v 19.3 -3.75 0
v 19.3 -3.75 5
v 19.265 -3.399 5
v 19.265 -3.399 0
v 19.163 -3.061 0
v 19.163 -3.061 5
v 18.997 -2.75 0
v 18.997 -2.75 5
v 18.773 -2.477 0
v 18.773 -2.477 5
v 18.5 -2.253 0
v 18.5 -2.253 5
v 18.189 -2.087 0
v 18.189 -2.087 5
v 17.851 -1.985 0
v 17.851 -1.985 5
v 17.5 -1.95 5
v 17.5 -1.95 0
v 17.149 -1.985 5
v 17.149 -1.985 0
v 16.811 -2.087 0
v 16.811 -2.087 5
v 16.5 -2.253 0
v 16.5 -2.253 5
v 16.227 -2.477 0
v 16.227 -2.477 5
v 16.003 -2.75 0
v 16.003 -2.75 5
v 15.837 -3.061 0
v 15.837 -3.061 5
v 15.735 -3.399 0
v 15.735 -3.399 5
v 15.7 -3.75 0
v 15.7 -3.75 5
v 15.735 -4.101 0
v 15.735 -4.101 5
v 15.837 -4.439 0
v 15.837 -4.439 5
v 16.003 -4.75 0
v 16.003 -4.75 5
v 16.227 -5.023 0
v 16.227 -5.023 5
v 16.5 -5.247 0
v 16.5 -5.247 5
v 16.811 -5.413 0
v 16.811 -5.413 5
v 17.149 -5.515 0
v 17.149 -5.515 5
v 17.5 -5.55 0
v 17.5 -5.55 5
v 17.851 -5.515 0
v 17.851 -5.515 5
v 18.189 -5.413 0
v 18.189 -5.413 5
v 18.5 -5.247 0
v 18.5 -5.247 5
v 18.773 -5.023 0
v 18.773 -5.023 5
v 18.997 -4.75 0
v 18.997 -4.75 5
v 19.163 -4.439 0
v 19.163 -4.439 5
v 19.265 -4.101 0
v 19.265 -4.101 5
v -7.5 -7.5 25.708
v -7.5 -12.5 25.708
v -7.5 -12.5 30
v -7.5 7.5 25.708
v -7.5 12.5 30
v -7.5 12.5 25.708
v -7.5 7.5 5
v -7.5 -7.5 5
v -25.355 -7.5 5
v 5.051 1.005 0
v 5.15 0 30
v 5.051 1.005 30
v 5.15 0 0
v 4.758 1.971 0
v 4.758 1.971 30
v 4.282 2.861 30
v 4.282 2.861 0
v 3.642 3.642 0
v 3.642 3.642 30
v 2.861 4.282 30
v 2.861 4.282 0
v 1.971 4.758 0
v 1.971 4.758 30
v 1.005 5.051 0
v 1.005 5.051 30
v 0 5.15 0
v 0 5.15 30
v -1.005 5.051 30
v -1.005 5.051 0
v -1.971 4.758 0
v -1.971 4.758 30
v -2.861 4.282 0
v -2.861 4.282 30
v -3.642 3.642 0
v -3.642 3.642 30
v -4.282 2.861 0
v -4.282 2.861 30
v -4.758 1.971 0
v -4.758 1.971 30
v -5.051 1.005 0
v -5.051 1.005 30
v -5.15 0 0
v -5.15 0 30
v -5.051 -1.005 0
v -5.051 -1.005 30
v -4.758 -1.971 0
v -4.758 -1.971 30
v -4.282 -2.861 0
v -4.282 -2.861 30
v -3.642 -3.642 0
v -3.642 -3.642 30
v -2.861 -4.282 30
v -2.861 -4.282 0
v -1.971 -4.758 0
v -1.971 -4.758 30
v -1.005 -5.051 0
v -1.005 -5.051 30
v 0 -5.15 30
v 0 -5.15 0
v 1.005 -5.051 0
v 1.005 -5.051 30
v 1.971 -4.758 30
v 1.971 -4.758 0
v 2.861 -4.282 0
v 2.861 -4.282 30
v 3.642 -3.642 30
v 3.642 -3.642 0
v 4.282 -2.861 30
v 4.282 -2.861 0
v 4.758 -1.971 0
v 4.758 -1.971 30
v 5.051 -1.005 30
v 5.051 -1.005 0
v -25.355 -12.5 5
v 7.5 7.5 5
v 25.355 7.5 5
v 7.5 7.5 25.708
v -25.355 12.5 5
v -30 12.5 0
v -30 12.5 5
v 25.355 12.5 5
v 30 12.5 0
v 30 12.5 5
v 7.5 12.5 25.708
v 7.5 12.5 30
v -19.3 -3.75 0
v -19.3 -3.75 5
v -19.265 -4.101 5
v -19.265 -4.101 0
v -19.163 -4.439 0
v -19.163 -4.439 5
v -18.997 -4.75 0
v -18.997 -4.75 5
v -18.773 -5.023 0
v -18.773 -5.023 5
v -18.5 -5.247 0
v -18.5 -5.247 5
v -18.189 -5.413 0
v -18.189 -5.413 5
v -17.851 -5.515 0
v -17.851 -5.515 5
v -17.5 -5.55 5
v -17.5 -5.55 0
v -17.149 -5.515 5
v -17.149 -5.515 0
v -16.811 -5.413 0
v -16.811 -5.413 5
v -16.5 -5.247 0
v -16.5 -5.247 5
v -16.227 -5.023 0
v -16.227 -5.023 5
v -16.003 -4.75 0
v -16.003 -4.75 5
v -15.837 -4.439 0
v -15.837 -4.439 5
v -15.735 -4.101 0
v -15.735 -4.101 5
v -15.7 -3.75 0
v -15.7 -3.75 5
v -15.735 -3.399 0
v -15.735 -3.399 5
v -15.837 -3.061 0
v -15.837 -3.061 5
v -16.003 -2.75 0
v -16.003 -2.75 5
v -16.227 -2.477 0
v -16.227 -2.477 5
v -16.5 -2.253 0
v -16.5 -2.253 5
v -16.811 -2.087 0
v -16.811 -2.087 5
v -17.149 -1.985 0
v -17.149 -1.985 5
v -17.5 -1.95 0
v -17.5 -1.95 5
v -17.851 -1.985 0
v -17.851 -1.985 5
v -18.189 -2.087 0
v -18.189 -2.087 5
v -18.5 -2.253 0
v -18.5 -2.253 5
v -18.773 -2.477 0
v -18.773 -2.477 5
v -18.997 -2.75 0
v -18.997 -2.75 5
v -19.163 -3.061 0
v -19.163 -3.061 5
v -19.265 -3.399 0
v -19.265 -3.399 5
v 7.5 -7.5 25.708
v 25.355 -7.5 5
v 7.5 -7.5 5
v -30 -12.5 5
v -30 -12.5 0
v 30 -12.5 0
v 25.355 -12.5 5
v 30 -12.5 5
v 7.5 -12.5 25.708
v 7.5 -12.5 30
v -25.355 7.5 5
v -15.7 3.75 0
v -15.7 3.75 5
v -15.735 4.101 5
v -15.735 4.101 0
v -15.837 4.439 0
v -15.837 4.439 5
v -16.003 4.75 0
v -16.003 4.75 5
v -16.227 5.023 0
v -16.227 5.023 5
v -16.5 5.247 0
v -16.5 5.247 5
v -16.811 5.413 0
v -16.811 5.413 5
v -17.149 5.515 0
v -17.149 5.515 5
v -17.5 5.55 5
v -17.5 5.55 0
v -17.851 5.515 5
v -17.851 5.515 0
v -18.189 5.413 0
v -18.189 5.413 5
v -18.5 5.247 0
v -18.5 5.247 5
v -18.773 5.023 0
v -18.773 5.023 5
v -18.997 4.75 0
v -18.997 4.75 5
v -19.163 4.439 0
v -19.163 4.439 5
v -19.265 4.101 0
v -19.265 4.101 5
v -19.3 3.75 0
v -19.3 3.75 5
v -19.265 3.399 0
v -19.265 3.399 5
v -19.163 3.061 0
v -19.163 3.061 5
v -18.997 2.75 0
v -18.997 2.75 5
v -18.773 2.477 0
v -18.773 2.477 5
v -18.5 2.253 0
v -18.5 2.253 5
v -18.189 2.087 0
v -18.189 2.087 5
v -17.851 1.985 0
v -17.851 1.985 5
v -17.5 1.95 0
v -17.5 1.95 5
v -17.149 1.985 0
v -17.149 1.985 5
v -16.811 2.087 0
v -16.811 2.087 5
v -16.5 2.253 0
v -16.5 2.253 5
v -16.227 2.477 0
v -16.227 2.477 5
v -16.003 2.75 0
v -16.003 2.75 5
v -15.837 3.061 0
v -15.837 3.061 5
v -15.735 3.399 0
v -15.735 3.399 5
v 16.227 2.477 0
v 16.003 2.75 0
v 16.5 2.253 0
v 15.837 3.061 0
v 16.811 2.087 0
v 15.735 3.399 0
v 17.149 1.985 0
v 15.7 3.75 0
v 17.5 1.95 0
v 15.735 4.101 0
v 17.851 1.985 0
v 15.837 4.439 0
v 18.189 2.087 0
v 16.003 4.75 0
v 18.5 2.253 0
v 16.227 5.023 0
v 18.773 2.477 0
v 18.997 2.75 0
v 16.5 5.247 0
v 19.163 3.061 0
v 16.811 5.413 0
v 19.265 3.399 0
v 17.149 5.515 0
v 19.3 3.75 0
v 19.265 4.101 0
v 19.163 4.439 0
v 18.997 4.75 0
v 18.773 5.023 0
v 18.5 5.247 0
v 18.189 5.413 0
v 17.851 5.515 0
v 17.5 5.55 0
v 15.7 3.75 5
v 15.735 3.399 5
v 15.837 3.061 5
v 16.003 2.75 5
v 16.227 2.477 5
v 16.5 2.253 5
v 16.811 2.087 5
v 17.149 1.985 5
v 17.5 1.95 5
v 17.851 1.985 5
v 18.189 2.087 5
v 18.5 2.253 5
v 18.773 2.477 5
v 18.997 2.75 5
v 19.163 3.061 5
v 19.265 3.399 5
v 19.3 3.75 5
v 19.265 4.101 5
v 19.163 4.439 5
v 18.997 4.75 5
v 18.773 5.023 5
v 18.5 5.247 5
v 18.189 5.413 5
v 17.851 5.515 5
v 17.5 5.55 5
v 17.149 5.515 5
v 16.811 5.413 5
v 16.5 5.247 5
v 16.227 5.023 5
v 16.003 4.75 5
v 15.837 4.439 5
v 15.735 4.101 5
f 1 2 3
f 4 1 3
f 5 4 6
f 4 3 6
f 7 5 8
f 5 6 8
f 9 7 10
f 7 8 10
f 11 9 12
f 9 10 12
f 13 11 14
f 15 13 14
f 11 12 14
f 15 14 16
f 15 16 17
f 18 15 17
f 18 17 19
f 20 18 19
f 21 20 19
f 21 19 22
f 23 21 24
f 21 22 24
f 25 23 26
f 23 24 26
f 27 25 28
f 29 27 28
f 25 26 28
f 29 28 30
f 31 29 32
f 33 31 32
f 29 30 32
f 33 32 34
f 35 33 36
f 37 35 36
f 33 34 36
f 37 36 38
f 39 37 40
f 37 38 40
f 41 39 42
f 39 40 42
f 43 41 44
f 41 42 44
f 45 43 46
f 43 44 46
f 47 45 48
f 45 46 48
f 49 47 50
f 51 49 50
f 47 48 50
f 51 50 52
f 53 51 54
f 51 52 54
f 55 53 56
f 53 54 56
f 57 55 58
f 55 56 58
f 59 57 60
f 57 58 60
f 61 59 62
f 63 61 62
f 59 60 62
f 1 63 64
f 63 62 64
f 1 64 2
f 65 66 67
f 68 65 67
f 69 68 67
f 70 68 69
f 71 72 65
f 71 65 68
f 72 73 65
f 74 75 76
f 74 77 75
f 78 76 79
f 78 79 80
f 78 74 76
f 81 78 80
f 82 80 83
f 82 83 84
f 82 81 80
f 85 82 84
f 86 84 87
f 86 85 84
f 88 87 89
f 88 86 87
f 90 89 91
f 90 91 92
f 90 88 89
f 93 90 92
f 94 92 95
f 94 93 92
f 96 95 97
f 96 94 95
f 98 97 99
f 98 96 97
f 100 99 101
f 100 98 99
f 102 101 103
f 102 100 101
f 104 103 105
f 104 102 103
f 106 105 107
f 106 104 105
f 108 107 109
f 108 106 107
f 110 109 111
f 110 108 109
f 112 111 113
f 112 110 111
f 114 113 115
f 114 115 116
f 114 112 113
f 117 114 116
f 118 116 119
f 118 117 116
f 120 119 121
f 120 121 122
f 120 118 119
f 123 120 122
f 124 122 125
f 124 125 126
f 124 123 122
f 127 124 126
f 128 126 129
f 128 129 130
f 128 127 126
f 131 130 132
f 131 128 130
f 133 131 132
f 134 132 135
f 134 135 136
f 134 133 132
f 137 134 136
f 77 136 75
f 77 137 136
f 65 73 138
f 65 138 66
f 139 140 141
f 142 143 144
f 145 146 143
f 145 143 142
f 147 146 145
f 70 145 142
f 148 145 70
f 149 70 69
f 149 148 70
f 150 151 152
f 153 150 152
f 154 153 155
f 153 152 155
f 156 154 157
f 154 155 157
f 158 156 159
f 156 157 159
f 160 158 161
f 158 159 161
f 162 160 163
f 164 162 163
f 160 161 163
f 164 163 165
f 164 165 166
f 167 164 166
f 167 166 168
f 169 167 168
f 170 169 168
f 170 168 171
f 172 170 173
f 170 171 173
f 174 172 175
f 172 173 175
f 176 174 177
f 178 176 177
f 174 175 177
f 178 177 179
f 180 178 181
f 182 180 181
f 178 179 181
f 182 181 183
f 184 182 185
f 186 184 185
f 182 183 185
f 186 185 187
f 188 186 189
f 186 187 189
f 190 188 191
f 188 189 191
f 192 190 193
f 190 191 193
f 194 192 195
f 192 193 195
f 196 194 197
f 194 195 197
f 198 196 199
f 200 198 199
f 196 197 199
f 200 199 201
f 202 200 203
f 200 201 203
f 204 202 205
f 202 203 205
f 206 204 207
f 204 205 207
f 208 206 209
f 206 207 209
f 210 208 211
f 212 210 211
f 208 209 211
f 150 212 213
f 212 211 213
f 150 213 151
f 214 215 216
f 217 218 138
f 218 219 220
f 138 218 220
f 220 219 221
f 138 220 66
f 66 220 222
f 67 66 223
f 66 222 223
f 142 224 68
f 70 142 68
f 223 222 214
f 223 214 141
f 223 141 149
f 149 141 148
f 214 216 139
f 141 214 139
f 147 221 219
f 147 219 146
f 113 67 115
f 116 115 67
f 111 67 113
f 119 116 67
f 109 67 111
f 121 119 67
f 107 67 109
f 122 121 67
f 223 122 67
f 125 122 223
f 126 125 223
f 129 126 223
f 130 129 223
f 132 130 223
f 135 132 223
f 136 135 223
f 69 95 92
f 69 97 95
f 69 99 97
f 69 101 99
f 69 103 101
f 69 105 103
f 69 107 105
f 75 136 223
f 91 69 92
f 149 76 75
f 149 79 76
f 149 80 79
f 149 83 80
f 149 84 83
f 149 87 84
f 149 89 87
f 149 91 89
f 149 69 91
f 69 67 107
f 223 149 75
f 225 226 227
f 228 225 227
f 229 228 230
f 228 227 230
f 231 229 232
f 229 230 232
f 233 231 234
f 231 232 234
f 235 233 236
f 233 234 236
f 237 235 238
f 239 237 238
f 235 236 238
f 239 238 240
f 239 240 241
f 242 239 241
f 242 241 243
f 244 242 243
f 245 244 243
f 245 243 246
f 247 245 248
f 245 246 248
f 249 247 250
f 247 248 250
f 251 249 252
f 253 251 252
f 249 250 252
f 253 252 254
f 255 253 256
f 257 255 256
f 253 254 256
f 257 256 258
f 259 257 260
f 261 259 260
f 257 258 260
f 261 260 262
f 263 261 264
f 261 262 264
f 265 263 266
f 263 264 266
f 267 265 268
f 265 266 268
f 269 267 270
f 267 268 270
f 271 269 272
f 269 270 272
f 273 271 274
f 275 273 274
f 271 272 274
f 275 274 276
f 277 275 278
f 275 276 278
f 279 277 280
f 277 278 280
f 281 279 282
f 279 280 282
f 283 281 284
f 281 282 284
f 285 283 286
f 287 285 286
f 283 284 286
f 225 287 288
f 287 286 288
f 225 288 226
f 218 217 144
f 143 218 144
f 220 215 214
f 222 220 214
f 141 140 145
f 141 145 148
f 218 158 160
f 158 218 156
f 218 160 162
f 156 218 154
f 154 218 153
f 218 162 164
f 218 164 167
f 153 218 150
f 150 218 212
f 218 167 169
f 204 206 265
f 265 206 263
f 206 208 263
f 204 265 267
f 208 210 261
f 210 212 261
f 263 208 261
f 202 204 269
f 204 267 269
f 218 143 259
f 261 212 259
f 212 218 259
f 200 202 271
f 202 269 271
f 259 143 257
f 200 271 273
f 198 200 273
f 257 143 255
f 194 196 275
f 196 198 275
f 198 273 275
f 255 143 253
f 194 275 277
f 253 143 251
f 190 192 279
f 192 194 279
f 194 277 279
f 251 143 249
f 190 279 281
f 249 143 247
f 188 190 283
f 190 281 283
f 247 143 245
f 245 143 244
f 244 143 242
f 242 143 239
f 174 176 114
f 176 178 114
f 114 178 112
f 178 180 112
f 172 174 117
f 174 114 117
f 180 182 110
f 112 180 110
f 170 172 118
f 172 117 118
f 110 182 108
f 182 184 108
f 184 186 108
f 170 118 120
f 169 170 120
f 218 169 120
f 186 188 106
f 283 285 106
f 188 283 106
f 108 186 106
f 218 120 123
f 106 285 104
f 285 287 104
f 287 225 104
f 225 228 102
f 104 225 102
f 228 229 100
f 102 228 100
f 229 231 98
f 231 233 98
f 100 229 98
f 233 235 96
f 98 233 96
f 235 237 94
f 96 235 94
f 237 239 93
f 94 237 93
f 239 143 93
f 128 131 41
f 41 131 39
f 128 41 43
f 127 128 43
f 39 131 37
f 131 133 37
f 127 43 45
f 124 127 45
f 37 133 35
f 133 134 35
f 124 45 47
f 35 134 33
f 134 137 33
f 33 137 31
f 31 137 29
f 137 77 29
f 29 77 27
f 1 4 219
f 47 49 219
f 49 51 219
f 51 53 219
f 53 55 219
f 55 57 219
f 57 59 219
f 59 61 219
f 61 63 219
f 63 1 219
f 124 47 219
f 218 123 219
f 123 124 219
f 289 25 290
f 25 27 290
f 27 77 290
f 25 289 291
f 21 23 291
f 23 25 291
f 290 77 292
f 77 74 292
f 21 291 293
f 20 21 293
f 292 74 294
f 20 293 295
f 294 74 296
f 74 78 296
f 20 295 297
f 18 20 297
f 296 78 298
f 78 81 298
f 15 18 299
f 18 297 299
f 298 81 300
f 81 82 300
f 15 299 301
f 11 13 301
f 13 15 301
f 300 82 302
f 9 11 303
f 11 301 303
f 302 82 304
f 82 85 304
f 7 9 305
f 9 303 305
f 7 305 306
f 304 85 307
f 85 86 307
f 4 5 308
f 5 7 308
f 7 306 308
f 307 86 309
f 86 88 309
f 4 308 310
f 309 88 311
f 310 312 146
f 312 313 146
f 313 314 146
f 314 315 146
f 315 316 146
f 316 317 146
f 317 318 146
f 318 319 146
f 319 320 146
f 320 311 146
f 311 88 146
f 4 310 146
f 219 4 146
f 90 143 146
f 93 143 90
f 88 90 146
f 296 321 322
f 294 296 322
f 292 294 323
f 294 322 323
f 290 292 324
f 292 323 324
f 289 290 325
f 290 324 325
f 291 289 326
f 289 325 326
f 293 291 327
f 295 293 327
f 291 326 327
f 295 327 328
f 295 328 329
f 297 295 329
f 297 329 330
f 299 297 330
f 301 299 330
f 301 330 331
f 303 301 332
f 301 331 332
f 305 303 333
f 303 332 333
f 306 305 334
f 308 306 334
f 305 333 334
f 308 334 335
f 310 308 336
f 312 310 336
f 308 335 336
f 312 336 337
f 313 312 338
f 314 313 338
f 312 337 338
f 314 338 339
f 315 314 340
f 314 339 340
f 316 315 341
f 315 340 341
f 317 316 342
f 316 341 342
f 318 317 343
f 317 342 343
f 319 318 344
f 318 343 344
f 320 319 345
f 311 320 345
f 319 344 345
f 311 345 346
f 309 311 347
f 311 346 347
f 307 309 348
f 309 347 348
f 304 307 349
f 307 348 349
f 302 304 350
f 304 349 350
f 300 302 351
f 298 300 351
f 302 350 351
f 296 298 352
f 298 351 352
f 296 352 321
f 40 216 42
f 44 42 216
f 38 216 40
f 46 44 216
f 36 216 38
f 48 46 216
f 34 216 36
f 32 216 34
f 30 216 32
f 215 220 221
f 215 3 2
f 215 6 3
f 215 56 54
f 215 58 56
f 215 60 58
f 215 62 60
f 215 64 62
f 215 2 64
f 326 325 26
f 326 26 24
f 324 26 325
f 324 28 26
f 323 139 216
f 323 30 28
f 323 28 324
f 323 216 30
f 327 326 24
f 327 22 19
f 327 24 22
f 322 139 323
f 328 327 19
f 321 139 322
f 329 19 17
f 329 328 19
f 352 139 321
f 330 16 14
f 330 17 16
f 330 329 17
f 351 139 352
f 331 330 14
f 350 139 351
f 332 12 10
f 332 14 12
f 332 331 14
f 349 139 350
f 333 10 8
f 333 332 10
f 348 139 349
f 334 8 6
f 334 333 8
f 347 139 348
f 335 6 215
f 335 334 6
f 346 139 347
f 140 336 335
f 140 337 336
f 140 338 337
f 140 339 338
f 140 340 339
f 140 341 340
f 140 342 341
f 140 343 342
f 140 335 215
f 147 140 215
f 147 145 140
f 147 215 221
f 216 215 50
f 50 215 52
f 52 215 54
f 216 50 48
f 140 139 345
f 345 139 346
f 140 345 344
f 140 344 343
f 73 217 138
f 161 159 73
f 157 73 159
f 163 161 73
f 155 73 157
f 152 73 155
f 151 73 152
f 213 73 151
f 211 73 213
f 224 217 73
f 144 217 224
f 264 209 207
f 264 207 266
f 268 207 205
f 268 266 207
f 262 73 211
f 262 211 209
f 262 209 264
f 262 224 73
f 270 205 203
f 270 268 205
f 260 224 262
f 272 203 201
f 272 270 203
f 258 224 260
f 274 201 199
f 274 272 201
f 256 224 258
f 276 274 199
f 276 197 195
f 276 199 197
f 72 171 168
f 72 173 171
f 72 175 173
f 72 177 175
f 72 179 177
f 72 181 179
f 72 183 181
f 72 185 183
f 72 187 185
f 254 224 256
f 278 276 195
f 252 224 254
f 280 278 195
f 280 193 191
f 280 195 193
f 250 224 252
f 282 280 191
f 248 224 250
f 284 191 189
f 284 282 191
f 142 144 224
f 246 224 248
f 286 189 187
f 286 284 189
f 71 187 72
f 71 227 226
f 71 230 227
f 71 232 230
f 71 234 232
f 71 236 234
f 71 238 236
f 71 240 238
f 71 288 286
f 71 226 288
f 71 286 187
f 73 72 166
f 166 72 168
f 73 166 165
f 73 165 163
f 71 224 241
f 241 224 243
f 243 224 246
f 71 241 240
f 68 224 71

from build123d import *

# Parameters (mm, degrees)
SKETCH_1_W               = 40
SKETCH_1_H               = 15
EXTRUDE_1_DEPTH          = 5
SKETCH_2_R               = 5.15
SKETCH_2_R_2             = 1.8
CUT_EXTRUDE_1_DEPTH      = 5
SKETCH_3_W               = 15
SKETCH_3_H               = 15
SKETCH_3_R               = 5.05
EXTRUDE_2_DEPTH          = 25
SKETCH_4_R               = 5.5
CUT_EXTRUDE_2_DEPTH      = 31
SKETCH_5_W               = 10
SKETCH_5_H               = 15
EXTRUDE_3_DEPTH          = 5
SKETCH_6_R               = 1.8
CUT_EXTRUDE_3_DEPTH      = 5
SKETCH_7_W               = 60
SKETCH_7_H               = 5
EXTRUDE_4_DEPTH          = 5
SKETCH_8_W               = 15
SKETCH_8_H               = 5
EXTRUDE_5_DEPTH          = 25
RIB_1_REACH              = 51.244
SKETCH_9_WALL_W          = 127.83111072
SKETCH_9_WALL_H          = 5
MIRROR_2_COPY_1_REACH    = 51.244
MIRROR_2_COPY_1_SKETCH_W = 127.83111072
MIRROR_2_COPY_1_SKETCH_H = 5
SKETCH_11_R              = 1.8
EXTRUDE_6_DEPTH          = 5
SKETCH_12_R              = 1.8
CUT_EXTRUDE_4_DEPTH      = 5
SKETCH_13_R              = 5.5
SKETCH_13_R_2            = 5.15
EXTRUDE_7_DEPTH          = 25


with BuildPart() as part:
    # 草图1 → 凸台-拉伸1 (new body)
    with BuildSketch(Plane.XY):
        Rectangle(SKETCH_1_W, SKETCH_1_H)
    extrude(amount=EXTRUDE_1_DEPTH)

    # 草图2 → 切除-拉伸1 (cut)
    with BuildSketch(Plane.XY.offset(5)):
        Circle(SKETCH_2_R)
        with Locations((-12, 0)):
            Circle(SKETCH_2_R_2)
        with Locations(Location((12, 0, 0), (0, 0, 180))):
            Circle(SKETCH_2_R_2)
    extrude(amount=-CUT_EXTRUDE_1_DEPTH, mode=Mode.SUBTRACT)

    # 草图3 → 凸台-拉伸2 (add)
    with BuildSketch(Plane.XY.offset(5)):
        Rectangle(SKETCH_3_W, SKETCH_3_H)
        Circle(SKETCH_3_R, mode=Mode.SUBTRACT)
    extrude(amount=EXTRUDE_2_DEPTH)

    # 草图4 → 切除-拉伸2 (cut)
    with BuildSketch(Plane(origin=(0, 0, 5), x_dir=(-1, 0, 0), z_dir=(0, 0, -1))):
        Circle(SKETCH_4_R)
    extrude(amount=-CUT_EXTRUDE_2_DEPTH, mode=Mode.SUBTRACT)

    # 草图5 → 凸台-拉伸3 (add)
    with BuildSketch(Plane.XY.offset(5)):
        with Locations((-25, 0)):
            Rectangle(SKETCH_5_W, SKETCH_5_H)
        with Locations((25, 0)):
            Rectangle(SKETCH_5_W, SKETCH_5_H)
    extrude(amount=-EXTRUDE_3_DEPTH)

    # 草图6 → 切除-拉伸3 (cut)
    with BuildSketch(Plane.XY.offset(5)):
        with Locations((-24, 0)):
            Circle(SKETCH_6_R)
        with Locations(Location((24, 0, 0), (0, 0, 180))):
            Circle(SKETCH_6_R)
    extrude(amount=-CUT_EXTRUDE_3_DEPTH, mode=Mode.SUBTRACT)

    # 草图7 → 凸台-拉伸4 (add)
    with BuildSketch(Plane.XY.offset(5)):
        with Locations((0, 10)):
            Rectangle(SKETCH_7_W, SKETCH_7_H)
        with Locations((0, -10)):
            Rectangle(SKETCH_7_W, SKETCH_7_H)
    extrude(amount=-EXTRUDE_4_DEPTH)

    # 草图8 → 凸台-拉伸5 (add)
    with BuildSketch(Plane.XY.offset(5)):
        with Locations((0, 10)):
            Rectangle(SKETCH_8_W, SKETCH_8_H)
        with Locations((0, -10)):
            Rectangle(SKETCH_8_W, SKETCH_8_H)
    extrude(amount=EXTRUDE_5_DEPTH)

    # 草图9 wall → 筋1 (add, up to next)
    with BuildSketch(Plane(origin=(-16.427615827, 12.5, 15.353801199), x_dir=(0.653020400469, 0, 0.75734031754), z_dir=(0.75734031754, 0, -0.653020400469)), mode=Mode.PRIVATE) as rib_1_sk1:
        with Locations((0, 2.5)):
            Rectangle(SKETCH_9_WALL_W, SKETCH_9_WALL_H)
    rib_1_tool1 = extrude(rib_1_sk1.sketch, amount=RIB_1_REACH, mode=Mode.PRIVATE) - part.part
    rib_1 = rib_1_tool1.solids().sort_by_distance((-16.427615827, 12.5, 15.353801199))[0]
    add(rib_1)

    # 镜向1: 筋1 across plane
    add(rib_1.mirror(Plane.ZX))

    # 镜向2: 筋1 across plane
    add(rib_1.mirror(Plane.ZY))

    # 镜向2 copy 1 sketch → 镜向2 copy 1 (add, up to next)
    with BuildSketch(Plane(origin=(16.427615827, -12.5, 15.353801199), x_dir=(-0.653020400469, 0, 0.75734031754), z_dir=(-0.75734031754, 0, -0.653020400469)), mode=Mode.PRIVATE) as mirror_2_copy_1_sk1:
        with Locations((0, 2.5)):
            Rectangle(MIRROR_2_COPY_1_SKETCH_W, MIRROR_2_COPY_1_SKETCH_H)
    mirror_2_copy_1_tool1 = extrude(mirror_2_copy_1_sk1.sketch, amount=MIRROR_2_COPY_1_REACH, mode=Mode.PRIVATE) - part.part
    add(mirror_2_copy_1_tool1.solids().sort_by_distance((16.427615827, -12.5, 15.353801199))[0])

    # 草图11 → 凸台-拉伸6 (add)
    with BuildSketch(Plane.XY.offset(5)):
        with Locations((-24, 0)):
            Circle(SKETCH_11_R)
        with Locations((-12, 0)):
            Circle(SKETCH_11_R)
        with Locations((12, 0)):
            Circle(SKETCH_11_R)
        with Locations((24, 0)):
            Circle(SKETCH_11_R)
    extrude(amount=-EXTRUDE_6_DEPTH)

    # 草图12 → 切除-拉伸4 (cut)
    with BuildSketch(Plane.XY.offset(5)):
        with Locations((-17.5, 3.75)):
            Circle(SKETCH_12_R)
        with Locations(Location((-17.5, -3.75, 0), (0, 0, 180))):
            Circle(SKETCH_12_R)
        with Locations((17.5, -3.75)):
            Circle(SKETCH_12_R)
        with Locations(Location((17.5, 3.75, 0), (0, 0, 180))):
            Circle(SKETCH_12_R)
    extrude(amount=-CUT_EXTRUDE_4_DEPTH, mode=Mode.SUBTRACT)

    # 草图13 → 凸台-拉伸7 (add)
    with BuildSketch(Plane.XY.offset(5)):
        Circle(SKETCH_13_R)
        Circle(SKETCH_13_R_2, mode=Mode.SUBTRACT)
    extrude(amount=EXTRUDE_7_DEPTH)


solid = part.part
